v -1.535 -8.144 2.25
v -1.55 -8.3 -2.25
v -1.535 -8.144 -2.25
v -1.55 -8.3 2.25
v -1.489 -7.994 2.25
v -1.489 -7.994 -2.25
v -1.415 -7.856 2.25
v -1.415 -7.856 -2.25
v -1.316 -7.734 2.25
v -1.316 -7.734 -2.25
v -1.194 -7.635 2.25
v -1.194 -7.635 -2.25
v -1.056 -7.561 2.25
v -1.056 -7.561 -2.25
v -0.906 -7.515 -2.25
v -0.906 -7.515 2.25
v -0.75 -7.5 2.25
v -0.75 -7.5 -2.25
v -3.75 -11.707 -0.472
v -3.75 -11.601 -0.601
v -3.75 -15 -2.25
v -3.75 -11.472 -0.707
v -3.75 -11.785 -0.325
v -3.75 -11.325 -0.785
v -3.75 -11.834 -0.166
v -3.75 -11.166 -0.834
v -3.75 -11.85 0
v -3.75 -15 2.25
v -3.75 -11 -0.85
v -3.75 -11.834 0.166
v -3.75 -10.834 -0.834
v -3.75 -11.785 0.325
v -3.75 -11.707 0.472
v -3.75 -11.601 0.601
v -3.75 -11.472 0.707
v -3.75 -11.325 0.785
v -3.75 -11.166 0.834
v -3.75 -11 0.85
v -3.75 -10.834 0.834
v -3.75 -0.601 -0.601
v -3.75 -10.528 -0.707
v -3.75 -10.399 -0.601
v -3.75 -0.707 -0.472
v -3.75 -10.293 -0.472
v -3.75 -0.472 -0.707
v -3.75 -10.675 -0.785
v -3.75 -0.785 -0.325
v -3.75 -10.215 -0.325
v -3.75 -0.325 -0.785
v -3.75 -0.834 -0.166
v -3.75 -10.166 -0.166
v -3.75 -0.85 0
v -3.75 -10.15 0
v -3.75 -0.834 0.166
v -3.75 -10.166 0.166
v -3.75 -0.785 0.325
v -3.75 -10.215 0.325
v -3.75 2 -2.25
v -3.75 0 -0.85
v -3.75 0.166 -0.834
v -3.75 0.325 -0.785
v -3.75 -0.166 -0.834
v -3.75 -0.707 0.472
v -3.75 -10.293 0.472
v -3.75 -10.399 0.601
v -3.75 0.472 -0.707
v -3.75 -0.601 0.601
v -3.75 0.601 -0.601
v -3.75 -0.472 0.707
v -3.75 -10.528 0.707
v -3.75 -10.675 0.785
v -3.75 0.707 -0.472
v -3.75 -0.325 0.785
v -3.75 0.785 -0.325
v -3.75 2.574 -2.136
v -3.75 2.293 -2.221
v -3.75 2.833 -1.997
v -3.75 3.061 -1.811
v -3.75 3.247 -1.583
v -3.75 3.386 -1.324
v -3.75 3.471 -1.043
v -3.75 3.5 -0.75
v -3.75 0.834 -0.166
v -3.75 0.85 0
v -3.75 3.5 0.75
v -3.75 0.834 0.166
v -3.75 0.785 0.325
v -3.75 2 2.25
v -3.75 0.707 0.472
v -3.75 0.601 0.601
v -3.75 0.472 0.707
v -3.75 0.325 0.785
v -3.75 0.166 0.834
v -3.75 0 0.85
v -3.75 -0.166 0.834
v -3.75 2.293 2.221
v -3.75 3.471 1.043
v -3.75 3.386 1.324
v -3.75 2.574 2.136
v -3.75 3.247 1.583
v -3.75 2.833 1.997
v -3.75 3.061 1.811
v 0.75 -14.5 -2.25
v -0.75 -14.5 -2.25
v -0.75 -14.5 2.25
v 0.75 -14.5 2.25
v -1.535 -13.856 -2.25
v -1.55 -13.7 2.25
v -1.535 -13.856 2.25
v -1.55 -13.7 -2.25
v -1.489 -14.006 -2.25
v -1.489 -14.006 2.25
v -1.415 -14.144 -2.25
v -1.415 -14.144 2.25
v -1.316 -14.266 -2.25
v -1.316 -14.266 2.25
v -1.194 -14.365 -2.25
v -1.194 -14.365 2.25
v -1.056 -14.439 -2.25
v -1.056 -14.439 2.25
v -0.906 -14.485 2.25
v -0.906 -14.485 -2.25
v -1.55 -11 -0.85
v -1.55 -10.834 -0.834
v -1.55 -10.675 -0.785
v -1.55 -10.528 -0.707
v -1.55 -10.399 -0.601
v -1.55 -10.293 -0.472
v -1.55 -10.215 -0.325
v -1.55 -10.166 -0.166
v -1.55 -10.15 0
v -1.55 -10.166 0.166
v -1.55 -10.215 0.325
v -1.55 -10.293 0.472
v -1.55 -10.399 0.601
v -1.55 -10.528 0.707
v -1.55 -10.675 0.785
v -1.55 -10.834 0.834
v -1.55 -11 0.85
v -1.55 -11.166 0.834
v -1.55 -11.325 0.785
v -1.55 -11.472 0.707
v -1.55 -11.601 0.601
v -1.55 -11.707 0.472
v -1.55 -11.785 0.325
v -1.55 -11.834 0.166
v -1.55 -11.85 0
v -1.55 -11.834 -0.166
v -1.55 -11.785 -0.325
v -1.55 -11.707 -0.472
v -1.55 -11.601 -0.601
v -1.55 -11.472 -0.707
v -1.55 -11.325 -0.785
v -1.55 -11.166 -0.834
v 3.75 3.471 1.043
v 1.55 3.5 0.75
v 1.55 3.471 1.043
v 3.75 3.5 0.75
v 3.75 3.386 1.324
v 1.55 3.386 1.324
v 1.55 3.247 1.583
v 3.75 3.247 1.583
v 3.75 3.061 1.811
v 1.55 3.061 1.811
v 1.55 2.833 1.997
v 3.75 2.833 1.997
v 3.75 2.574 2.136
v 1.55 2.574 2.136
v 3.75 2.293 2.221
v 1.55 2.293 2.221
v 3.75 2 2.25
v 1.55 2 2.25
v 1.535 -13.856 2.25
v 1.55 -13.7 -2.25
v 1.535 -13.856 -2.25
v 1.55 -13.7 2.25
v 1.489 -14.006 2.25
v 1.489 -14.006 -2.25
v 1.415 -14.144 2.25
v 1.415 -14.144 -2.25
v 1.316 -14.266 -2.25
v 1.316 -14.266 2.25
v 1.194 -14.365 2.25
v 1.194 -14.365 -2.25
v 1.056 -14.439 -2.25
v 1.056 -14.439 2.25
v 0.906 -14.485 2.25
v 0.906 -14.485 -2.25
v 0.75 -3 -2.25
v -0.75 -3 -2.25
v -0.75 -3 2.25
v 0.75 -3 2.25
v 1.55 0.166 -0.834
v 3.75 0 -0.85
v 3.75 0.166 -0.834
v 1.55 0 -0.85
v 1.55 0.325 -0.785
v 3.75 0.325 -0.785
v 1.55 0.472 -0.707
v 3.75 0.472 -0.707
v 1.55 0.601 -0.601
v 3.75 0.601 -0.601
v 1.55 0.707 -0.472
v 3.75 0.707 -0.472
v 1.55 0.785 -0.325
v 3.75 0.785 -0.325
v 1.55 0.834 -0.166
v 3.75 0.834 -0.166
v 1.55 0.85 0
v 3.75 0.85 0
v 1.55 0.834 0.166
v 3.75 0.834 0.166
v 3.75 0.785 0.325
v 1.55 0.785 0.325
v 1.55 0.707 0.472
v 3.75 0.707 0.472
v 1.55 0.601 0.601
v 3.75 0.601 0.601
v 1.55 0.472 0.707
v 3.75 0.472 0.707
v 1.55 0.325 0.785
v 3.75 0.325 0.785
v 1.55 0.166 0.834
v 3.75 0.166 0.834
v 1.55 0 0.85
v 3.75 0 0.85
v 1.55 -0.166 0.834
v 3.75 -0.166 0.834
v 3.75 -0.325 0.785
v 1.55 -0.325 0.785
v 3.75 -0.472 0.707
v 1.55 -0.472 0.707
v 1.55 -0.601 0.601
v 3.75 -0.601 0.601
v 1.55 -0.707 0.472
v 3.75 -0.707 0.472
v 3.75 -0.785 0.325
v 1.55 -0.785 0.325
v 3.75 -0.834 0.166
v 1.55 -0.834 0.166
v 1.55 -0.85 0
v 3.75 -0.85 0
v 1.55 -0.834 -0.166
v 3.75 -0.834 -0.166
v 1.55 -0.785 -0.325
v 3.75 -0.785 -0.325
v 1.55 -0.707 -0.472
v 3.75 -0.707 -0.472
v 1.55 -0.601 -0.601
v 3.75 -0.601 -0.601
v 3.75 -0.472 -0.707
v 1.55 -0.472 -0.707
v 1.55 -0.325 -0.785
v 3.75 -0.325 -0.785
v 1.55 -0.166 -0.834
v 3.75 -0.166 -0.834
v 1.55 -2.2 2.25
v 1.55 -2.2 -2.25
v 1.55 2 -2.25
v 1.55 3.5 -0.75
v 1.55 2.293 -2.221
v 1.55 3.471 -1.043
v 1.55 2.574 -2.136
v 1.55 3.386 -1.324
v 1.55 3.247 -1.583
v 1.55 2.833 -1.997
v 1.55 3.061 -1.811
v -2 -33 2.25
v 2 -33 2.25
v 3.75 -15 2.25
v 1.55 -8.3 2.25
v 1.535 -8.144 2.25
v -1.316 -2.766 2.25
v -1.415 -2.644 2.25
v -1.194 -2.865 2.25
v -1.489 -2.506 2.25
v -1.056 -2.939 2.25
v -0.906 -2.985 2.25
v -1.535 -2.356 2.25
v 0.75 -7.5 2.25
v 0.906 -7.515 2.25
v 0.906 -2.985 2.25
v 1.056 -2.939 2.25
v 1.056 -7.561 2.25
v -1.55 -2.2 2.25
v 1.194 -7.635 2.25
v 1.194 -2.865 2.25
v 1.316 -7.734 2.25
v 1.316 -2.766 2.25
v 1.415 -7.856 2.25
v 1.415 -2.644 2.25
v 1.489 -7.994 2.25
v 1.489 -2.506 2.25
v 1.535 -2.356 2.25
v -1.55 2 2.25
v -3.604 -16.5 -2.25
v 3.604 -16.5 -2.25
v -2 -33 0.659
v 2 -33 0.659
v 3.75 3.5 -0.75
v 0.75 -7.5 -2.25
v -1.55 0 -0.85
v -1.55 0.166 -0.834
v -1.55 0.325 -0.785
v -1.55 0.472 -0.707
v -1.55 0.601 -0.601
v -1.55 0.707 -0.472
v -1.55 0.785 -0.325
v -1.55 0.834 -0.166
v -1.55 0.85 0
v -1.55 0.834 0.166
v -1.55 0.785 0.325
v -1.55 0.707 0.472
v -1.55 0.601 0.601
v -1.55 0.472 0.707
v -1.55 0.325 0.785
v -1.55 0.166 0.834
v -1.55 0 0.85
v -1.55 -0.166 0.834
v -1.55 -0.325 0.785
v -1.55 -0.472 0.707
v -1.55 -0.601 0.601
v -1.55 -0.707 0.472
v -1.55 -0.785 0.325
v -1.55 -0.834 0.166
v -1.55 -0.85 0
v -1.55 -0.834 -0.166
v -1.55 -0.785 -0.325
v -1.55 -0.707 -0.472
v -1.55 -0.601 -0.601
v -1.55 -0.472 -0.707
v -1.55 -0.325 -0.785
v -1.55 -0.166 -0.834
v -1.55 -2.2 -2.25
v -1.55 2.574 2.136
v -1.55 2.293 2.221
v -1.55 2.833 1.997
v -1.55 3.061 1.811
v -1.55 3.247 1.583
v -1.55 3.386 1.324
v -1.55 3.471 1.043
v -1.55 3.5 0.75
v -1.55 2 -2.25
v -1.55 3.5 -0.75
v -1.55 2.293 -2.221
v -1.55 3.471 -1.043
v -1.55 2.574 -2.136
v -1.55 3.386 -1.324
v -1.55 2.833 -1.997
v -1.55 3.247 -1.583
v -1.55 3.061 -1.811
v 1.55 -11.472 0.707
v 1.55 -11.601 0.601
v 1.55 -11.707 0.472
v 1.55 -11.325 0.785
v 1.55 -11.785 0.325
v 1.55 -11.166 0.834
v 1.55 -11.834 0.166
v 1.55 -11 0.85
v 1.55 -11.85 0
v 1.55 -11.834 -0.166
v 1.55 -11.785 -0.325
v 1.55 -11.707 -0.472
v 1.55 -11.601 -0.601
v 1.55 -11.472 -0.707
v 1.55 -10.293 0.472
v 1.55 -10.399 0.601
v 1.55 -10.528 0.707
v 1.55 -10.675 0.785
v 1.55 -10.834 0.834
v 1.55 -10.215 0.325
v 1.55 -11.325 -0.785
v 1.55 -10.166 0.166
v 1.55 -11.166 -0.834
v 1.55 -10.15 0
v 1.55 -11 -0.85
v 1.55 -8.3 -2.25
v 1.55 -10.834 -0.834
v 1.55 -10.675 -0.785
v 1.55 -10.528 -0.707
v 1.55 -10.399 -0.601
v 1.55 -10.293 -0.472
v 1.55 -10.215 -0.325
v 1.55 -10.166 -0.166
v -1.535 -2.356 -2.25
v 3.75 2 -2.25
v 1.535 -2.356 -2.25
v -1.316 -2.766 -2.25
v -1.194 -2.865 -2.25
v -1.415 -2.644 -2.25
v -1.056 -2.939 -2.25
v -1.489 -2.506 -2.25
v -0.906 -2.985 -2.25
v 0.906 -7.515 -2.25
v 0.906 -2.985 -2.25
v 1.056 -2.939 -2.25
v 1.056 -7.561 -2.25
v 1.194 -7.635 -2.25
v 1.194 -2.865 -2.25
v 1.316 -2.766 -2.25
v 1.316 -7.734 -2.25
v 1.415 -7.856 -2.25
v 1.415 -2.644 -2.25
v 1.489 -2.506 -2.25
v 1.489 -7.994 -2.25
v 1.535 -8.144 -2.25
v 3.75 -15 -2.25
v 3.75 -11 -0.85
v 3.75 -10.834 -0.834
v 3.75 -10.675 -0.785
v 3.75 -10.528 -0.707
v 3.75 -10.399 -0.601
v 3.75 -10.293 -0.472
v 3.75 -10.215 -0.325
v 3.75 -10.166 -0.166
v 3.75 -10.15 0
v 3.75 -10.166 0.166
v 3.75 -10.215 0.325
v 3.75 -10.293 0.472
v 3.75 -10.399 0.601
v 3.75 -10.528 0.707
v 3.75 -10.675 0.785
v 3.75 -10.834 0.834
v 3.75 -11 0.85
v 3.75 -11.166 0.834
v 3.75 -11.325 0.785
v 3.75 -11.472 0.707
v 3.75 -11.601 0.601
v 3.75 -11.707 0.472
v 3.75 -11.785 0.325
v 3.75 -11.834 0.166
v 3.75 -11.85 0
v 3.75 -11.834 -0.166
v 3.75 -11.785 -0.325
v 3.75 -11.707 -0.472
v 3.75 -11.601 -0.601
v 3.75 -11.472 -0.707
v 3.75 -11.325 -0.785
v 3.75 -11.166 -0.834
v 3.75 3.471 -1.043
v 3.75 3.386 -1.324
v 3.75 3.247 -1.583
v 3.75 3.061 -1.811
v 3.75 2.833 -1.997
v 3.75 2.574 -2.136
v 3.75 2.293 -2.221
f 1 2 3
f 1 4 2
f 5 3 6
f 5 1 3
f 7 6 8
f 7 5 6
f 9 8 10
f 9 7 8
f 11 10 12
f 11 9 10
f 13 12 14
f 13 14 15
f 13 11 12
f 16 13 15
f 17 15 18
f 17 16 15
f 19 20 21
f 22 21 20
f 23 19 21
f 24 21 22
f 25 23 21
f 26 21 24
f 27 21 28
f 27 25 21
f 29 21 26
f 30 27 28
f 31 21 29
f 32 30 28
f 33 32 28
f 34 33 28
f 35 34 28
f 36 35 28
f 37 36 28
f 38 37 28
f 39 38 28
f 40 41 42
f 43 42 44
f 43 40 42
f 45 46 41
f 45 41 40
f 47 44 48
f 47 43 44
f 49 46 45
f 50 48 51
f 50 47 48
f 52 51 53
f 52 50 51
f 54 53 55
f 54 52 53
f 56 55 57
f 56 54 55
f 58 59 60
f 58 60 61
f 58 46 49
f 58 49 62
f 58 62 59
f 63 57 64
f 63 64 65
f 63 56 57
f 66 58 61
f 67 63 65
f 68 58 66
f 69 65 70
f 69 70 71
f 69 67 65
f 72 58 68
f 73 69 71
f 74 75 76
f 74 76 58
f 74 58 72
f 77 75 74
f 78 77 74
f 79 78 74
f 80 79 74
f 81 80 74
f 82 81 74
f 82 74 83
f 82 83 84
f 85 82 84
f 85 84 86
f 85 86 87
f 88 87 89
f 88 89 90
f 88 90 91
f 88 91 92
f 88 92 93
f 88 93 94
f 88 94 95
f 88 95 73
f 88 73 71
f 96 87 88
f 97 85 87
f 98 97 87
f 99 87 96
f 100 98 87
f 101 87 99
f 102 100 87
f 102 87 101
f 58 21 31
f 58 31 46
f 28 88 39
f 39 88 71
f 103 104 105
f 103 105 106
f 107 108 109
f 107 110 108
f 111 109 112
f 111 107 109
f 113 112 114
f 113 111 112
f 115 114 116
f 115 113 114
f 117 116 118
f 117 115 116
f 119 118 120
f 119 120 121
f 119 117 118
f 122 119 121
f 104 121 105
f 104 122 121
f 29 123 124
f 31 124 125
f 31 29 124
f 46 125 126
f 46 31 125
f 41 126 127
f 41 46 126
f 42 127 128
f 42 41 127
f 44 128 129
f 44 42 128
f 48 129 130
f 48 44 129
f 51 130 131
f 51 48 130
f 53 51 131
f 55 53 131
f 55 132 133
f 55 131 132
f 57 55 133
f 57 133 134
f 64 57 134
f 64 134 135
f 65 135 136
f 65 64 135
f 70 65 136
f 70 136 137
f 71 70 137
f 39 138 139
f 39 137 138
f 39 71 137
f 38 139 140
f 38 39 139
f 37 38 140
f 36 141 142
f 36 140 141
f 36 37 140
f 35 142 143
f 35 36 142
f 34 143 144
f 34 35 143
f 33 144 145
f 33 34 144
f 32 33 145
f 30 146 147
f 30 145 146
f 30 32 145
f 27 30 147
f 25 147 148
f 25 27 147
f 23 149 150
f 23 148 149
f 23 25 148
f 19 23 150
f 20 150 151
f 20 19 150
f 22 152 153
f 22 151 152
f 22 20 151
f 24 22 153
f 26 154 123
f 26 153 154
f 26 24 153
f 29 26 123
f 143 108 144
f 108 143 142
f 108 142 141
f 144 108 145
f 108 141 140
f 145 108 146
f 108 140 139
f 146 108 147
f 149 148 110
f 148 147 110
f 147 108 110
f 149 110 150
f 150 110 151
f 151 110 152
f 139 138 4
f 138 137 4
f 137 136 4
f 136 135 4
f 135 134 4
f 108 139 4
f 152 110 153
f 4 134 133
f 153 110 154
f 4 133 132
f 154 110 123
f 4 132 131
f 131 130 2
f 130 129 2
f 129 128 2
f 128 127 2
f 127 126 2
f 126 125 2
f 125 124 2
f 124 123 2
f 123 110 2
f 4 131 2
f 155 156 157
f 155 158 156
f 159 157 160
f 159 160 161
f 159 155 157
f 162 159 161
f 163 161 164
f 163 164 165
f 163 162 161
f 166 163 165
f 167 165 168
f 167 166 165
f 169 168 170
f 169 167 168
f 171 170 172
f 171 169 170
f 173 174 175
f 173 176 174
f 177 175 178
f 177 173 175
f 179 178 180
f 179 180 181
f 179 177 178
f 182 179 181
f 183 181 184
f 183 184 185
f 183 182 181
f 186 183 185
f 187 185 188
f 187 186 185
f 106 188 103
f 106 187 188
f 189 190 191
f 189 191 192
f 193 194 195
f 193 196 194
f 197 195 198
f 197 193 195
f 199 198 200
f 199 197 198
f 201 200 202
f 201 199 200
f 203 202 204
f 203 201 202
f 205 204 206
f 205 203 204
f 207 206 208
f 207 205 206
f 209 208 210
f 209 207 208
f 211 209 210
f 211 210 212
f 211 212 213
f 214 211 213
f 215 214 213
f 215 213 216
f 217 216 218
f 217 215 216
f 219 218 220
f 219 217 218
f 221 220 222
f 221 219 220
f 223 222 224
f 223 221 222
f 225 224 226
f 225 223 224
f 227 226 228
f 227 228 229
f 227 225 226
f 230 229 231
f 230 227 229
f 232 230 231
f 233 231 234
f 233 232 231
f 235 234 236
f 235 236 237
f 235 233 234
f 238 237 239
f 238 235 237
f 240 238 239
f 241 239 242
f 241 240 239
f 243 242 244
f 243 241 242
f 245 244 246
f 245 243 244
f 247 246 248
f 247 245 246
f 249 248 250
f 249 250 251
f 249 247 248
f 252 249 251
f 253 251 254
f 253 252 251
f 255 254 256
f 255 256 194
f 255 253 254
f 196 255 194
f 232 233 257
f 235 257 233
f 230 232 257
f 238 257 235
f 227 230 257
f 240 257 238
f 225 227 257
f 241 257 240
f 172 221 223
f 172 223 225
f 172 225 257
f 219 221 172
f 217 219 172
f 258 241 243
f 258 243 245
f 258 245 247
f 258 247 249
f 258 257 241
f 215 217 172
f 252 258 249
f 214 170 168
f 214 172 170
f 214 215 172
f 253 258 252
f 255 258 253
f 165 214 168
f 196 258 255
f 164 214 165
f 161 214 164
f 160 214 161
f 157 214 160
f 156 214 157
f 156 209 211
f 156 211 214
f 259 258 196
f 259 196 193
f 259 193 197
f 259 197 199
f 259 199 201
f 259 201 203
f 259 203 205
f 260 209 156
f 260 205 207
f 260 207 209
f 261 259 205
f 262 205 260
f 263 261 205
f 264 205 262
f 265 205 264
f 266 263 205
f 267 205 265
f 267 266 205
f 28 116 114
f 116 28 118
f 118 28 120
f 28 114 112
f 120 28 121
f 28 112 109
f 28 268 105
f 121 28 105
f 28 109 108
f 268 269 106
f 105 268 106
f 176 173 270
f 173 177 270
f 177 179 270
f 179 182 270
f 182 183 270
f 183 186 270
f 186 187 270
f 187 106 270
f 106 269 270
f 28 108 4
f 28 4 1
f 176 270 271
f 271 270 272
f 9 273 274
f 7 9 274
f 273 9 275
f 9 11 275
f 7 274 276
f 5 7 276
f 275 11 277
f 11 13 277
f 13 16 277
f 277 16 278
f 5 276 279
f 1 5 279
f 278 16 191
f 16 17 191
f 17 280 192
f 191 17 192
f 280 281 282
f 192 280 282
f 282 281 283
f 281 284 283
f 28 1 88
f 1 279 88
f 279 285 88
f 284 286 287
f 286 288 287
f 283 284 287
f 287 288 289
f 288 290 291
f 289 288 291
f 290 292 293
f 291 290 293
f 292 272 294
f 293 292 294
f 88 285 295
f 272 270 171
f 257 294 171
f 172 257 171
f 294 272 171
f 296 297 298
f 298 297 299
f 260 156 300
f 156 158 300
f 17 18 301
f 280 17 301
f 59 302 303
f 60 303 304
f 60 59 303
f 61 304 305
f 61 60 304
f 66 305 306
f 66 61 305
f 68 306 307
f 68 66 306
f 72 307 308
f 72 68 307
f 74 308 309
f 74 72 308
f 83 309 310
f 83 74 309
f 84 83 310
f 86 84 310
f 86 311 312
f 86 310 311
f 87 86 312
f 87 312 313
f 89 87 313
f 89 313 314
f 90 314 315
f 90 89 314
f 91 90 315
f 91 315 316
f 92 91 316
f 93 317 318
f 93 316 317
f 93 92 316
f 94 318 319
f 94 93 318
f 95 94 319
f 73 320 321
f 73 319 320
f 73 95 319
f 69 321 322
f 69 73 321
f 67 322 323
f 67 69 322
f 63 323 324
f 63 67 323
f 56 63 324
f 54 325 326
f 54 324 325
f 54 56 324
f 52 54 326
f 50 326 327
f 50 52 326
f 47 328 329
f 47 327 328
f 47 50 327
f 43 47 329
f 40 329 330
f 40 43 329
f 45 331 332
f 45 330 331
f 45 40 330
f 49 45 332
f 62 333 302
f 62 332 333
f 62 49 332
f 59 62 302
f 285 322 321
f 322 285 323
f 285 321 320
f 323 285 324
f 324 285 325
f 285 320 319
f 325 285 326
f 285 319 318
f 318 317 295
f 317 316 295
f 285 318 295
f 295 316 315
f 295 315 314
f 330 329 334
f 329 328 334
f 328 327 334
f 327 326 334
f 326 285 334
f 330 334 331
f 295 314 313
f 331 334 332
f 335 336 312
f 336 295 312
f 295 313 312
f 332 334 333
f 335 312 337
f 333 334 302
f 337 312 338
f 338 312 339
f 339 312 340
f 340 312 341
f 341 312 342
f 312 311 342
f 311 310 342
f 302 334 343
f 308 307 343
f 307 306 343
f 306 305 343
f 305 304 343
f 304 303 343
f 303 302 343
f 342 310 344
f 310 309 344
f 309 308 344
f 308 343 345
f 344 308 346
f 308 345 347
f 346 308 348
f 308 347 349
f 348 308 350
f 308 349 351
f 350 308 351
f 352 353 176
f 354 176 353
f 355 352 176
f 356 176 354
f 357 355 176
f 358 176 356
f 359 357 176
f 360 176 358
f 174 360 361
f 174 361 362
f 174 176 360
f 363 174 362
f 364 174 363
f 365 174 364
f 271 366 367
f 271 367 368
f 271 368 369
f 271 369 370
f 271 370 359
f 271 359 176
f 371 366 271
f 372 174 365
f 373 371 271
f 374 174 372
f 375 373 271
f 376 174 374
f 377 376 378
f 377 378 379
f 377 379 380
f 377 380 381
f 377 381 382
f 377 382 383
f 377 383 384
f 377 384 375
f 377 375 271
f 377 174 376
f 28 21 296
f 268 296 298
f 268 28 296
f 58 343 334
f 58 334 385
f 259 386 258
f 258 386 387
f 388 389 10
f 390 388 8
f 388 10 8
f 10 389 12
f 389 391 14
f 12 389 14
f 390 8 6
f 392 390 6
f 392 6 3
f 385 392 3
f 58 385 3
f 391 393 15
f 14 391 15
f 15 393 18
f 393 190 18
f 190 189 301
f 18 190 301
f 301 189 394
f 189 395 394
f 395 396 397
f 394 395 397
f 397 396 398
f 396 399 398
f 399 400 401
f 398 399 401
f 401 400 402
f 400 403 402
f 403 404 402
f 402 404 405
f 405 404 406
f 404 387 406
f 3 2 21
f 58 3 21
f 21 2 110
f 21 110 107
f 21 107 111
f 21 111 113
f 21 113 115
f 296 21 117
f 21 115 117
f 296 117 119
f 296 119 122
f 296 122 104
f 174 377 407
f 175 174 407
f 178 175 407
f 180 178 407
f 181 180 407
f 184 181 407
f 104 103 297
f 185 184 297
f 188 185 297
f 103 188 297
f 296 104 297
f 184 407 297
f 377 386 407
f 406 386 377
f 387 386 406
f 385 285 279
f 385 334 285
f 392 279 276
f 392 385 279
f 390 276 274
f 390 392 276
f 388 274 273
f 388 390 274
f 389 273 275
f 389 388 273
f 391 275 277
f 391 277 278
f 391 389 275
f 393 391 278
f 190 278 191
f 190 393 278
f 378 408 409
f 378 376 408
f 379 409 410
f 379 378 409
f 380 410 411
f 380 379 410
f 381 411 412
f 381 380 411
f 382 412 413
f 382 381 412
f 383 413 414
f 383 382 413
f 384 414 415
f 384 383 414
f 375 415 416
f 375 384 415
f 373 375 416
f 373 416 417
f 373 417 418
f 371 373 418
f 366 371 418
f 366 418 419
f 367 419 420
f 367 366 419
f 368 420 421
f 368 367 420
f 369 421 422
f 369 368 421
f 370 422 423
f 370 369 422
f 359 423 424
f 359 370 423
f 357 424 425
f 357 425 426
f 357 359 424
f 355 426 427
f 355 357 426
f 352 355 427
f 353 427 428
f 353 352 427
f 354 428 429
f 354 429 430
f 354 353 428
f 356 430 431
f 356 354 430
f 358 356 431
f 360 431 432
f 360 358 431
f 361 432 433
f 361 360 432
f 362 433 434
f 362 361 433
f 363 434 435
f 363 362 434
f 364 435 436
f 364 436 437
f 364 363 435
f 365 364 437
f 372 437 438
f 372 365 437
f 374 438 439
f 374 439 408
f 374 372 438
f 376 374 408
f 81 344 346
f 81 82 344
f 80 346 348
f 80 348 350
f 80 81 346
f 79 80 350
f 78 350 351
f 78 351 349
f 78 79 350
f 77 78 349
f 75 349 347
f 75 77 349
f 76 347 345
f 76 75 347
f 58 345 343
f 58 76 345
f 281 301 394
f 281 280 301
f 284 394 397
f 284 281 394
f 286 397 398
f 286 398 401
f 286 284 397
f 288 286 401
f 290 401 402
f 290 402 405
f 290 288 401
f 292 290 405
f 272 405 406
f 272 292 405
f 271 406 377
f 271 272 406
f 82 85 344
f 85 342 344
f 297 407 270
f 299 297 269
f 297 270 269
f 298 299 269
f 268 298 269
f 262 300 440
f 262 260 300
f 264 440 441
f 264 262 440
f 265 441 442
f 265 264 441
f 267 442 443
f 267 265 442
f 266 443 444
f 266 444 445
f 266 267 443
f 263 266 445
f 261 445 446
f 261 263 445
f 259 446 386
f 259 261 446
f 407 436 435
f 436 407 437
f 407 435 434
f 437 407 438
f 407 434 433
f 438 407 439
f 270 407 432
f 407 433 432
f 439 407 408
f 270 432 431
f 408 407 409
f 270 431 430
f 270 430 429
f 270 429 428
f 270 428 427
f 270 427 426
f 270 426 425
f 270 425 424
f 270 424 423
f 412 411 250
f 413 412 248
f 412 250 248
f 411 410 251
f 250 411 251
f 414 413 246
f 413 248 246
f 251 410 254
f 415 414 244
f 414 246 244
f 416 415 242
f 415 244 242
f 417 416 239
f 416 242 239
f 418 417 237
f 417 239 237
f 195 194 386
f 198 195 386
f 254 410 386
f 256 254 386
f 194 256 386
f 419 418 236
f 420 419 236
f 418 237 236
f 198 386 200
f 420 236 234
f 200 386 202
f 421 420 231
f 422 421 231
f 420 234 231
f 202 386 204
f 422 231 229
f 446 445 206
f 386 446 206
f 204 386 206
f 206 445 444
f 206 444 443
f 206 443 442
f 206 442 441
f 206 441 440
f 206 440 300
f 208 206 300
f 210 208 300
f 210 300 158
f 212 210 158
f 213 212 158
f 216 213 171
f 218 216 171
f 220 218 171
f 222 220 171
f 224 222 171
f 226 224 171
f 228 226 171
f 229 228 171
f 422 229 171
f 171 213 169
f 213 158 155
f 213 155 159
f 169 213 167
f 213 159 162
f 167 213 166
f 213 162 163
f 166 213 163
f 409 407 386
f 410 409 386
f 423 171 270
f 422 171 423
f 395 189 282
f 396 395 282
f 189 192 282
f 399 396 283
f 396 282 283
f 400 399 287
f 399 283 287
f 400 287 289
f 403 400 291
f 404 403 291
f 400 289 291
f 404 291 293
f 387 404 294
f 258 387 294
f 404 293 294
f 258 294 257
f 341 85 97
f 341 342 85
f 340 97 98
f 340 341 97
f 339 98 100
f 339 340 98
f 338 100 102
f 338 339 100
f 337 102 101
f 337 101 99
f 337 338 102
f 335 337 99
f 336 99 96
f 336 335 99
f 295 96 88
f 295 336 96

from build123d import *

# Parameters (mm, degrees)
SKETCH_1_R               = 0.85
EXTRUDE_1_DEPTH          = 3.75
SKETCH_2_W               = 3.1
SKETCH_2_H               = 7.782870542
SKETCH_2_H_2             = 7
CUT_EXTRUDE_1_DEPTH      = 3.25
CUT_EXTRUDE_1_DEPTH_BACK = 3.25
FILLET_1_R               = 1.5
FILLET_2_R               = 0.8
CUT_EXTRUDE_2_DEPTH      = 5.5


with BuildPart() as part:
    # 草图1 → 凸台-拉伸1 (new body, symmetric)
    with BuildSketch(Plane(origin=(0, 0, 0), x_dir=(0, 0, -1), z_dir=(1, 0, 0))):
        Polygon((-2.25, 3.5), (2.25, 3.5), (2.25, -16.5), (-0.659395182, -33), (-2.25, -33), align=None)
        Circle(SKETCH_1_R, mode=Mode.SUBTRACT)
        with Locations((0, -11)):
            Circle(SKETCH_1_R, mode=Mode.SUBTRACT)
    extrude(amount=EXTRUDE_1_DEPTH, both=True)

    # 草图2 → 切除-拉伸1 (cut, two sides)
    with BuildSketch(Plane.XY) as cut_extrude_1_sk:
        with Locations((0, 0.891435271)):
            Rectangle(SKETCH_2_W, SKETCH_2_H)
        with Locations((0, -11)):
            Rectangle(SKETCH_2_W, SKETCH_2_H_2)
    extrude(amount=CUT_EXTRUDE_1_DEPTH, mode=Mode.SUBTRACT)
    extrude(cut_extrude_1_sk.sketch, amount=-CUT_EXTRUDE_1_DEPTH_BACK, mode=Mode.SUBTRACT)

    # 圆角1
    fillet_1_edges = [part.edges().sort_by_distance(p)[0] for p in [
        (-2.65, 3.5, 2.25),
        (-2.65, 3.5, -2.25),
        (2.65, 3.5, 2.25),
        (2.65, 3.5, -2.25),
    ]]
    fillet(fillet_1_edges, radius=FILLET_1_R)

    # 圆角2
    fillet_2_edges = [part.edges().sort_by_distance(p)[0] for p in [
        (-1.55, -3, 0),
        (1.55, -3, 0),
        (-1.55, -7.5, 0),
        (1.55, -7.5, 0),
        (1.55, -14.5, 0),
        (-1.55, -14.5, 0),
    ]]
    fillet(fillet_2_edges, radius=FILLET_2_R)

    # 草图3 → 切除-拉伸2 (cut, through all)
    with BuildSketch(Plane.XY.offset(2.25)):
        Polygon((-3.75, -15), (-2, -33), (-6.857355495, -33), align=None)
        Polygon((6.857355495, -33), (3.75, -15), (2, -33), align=None)
    extrude(amount=-CUT_EXTRUDE_2_DEPTH, mode=Mode.SUBTRACT)


solid = part.part
